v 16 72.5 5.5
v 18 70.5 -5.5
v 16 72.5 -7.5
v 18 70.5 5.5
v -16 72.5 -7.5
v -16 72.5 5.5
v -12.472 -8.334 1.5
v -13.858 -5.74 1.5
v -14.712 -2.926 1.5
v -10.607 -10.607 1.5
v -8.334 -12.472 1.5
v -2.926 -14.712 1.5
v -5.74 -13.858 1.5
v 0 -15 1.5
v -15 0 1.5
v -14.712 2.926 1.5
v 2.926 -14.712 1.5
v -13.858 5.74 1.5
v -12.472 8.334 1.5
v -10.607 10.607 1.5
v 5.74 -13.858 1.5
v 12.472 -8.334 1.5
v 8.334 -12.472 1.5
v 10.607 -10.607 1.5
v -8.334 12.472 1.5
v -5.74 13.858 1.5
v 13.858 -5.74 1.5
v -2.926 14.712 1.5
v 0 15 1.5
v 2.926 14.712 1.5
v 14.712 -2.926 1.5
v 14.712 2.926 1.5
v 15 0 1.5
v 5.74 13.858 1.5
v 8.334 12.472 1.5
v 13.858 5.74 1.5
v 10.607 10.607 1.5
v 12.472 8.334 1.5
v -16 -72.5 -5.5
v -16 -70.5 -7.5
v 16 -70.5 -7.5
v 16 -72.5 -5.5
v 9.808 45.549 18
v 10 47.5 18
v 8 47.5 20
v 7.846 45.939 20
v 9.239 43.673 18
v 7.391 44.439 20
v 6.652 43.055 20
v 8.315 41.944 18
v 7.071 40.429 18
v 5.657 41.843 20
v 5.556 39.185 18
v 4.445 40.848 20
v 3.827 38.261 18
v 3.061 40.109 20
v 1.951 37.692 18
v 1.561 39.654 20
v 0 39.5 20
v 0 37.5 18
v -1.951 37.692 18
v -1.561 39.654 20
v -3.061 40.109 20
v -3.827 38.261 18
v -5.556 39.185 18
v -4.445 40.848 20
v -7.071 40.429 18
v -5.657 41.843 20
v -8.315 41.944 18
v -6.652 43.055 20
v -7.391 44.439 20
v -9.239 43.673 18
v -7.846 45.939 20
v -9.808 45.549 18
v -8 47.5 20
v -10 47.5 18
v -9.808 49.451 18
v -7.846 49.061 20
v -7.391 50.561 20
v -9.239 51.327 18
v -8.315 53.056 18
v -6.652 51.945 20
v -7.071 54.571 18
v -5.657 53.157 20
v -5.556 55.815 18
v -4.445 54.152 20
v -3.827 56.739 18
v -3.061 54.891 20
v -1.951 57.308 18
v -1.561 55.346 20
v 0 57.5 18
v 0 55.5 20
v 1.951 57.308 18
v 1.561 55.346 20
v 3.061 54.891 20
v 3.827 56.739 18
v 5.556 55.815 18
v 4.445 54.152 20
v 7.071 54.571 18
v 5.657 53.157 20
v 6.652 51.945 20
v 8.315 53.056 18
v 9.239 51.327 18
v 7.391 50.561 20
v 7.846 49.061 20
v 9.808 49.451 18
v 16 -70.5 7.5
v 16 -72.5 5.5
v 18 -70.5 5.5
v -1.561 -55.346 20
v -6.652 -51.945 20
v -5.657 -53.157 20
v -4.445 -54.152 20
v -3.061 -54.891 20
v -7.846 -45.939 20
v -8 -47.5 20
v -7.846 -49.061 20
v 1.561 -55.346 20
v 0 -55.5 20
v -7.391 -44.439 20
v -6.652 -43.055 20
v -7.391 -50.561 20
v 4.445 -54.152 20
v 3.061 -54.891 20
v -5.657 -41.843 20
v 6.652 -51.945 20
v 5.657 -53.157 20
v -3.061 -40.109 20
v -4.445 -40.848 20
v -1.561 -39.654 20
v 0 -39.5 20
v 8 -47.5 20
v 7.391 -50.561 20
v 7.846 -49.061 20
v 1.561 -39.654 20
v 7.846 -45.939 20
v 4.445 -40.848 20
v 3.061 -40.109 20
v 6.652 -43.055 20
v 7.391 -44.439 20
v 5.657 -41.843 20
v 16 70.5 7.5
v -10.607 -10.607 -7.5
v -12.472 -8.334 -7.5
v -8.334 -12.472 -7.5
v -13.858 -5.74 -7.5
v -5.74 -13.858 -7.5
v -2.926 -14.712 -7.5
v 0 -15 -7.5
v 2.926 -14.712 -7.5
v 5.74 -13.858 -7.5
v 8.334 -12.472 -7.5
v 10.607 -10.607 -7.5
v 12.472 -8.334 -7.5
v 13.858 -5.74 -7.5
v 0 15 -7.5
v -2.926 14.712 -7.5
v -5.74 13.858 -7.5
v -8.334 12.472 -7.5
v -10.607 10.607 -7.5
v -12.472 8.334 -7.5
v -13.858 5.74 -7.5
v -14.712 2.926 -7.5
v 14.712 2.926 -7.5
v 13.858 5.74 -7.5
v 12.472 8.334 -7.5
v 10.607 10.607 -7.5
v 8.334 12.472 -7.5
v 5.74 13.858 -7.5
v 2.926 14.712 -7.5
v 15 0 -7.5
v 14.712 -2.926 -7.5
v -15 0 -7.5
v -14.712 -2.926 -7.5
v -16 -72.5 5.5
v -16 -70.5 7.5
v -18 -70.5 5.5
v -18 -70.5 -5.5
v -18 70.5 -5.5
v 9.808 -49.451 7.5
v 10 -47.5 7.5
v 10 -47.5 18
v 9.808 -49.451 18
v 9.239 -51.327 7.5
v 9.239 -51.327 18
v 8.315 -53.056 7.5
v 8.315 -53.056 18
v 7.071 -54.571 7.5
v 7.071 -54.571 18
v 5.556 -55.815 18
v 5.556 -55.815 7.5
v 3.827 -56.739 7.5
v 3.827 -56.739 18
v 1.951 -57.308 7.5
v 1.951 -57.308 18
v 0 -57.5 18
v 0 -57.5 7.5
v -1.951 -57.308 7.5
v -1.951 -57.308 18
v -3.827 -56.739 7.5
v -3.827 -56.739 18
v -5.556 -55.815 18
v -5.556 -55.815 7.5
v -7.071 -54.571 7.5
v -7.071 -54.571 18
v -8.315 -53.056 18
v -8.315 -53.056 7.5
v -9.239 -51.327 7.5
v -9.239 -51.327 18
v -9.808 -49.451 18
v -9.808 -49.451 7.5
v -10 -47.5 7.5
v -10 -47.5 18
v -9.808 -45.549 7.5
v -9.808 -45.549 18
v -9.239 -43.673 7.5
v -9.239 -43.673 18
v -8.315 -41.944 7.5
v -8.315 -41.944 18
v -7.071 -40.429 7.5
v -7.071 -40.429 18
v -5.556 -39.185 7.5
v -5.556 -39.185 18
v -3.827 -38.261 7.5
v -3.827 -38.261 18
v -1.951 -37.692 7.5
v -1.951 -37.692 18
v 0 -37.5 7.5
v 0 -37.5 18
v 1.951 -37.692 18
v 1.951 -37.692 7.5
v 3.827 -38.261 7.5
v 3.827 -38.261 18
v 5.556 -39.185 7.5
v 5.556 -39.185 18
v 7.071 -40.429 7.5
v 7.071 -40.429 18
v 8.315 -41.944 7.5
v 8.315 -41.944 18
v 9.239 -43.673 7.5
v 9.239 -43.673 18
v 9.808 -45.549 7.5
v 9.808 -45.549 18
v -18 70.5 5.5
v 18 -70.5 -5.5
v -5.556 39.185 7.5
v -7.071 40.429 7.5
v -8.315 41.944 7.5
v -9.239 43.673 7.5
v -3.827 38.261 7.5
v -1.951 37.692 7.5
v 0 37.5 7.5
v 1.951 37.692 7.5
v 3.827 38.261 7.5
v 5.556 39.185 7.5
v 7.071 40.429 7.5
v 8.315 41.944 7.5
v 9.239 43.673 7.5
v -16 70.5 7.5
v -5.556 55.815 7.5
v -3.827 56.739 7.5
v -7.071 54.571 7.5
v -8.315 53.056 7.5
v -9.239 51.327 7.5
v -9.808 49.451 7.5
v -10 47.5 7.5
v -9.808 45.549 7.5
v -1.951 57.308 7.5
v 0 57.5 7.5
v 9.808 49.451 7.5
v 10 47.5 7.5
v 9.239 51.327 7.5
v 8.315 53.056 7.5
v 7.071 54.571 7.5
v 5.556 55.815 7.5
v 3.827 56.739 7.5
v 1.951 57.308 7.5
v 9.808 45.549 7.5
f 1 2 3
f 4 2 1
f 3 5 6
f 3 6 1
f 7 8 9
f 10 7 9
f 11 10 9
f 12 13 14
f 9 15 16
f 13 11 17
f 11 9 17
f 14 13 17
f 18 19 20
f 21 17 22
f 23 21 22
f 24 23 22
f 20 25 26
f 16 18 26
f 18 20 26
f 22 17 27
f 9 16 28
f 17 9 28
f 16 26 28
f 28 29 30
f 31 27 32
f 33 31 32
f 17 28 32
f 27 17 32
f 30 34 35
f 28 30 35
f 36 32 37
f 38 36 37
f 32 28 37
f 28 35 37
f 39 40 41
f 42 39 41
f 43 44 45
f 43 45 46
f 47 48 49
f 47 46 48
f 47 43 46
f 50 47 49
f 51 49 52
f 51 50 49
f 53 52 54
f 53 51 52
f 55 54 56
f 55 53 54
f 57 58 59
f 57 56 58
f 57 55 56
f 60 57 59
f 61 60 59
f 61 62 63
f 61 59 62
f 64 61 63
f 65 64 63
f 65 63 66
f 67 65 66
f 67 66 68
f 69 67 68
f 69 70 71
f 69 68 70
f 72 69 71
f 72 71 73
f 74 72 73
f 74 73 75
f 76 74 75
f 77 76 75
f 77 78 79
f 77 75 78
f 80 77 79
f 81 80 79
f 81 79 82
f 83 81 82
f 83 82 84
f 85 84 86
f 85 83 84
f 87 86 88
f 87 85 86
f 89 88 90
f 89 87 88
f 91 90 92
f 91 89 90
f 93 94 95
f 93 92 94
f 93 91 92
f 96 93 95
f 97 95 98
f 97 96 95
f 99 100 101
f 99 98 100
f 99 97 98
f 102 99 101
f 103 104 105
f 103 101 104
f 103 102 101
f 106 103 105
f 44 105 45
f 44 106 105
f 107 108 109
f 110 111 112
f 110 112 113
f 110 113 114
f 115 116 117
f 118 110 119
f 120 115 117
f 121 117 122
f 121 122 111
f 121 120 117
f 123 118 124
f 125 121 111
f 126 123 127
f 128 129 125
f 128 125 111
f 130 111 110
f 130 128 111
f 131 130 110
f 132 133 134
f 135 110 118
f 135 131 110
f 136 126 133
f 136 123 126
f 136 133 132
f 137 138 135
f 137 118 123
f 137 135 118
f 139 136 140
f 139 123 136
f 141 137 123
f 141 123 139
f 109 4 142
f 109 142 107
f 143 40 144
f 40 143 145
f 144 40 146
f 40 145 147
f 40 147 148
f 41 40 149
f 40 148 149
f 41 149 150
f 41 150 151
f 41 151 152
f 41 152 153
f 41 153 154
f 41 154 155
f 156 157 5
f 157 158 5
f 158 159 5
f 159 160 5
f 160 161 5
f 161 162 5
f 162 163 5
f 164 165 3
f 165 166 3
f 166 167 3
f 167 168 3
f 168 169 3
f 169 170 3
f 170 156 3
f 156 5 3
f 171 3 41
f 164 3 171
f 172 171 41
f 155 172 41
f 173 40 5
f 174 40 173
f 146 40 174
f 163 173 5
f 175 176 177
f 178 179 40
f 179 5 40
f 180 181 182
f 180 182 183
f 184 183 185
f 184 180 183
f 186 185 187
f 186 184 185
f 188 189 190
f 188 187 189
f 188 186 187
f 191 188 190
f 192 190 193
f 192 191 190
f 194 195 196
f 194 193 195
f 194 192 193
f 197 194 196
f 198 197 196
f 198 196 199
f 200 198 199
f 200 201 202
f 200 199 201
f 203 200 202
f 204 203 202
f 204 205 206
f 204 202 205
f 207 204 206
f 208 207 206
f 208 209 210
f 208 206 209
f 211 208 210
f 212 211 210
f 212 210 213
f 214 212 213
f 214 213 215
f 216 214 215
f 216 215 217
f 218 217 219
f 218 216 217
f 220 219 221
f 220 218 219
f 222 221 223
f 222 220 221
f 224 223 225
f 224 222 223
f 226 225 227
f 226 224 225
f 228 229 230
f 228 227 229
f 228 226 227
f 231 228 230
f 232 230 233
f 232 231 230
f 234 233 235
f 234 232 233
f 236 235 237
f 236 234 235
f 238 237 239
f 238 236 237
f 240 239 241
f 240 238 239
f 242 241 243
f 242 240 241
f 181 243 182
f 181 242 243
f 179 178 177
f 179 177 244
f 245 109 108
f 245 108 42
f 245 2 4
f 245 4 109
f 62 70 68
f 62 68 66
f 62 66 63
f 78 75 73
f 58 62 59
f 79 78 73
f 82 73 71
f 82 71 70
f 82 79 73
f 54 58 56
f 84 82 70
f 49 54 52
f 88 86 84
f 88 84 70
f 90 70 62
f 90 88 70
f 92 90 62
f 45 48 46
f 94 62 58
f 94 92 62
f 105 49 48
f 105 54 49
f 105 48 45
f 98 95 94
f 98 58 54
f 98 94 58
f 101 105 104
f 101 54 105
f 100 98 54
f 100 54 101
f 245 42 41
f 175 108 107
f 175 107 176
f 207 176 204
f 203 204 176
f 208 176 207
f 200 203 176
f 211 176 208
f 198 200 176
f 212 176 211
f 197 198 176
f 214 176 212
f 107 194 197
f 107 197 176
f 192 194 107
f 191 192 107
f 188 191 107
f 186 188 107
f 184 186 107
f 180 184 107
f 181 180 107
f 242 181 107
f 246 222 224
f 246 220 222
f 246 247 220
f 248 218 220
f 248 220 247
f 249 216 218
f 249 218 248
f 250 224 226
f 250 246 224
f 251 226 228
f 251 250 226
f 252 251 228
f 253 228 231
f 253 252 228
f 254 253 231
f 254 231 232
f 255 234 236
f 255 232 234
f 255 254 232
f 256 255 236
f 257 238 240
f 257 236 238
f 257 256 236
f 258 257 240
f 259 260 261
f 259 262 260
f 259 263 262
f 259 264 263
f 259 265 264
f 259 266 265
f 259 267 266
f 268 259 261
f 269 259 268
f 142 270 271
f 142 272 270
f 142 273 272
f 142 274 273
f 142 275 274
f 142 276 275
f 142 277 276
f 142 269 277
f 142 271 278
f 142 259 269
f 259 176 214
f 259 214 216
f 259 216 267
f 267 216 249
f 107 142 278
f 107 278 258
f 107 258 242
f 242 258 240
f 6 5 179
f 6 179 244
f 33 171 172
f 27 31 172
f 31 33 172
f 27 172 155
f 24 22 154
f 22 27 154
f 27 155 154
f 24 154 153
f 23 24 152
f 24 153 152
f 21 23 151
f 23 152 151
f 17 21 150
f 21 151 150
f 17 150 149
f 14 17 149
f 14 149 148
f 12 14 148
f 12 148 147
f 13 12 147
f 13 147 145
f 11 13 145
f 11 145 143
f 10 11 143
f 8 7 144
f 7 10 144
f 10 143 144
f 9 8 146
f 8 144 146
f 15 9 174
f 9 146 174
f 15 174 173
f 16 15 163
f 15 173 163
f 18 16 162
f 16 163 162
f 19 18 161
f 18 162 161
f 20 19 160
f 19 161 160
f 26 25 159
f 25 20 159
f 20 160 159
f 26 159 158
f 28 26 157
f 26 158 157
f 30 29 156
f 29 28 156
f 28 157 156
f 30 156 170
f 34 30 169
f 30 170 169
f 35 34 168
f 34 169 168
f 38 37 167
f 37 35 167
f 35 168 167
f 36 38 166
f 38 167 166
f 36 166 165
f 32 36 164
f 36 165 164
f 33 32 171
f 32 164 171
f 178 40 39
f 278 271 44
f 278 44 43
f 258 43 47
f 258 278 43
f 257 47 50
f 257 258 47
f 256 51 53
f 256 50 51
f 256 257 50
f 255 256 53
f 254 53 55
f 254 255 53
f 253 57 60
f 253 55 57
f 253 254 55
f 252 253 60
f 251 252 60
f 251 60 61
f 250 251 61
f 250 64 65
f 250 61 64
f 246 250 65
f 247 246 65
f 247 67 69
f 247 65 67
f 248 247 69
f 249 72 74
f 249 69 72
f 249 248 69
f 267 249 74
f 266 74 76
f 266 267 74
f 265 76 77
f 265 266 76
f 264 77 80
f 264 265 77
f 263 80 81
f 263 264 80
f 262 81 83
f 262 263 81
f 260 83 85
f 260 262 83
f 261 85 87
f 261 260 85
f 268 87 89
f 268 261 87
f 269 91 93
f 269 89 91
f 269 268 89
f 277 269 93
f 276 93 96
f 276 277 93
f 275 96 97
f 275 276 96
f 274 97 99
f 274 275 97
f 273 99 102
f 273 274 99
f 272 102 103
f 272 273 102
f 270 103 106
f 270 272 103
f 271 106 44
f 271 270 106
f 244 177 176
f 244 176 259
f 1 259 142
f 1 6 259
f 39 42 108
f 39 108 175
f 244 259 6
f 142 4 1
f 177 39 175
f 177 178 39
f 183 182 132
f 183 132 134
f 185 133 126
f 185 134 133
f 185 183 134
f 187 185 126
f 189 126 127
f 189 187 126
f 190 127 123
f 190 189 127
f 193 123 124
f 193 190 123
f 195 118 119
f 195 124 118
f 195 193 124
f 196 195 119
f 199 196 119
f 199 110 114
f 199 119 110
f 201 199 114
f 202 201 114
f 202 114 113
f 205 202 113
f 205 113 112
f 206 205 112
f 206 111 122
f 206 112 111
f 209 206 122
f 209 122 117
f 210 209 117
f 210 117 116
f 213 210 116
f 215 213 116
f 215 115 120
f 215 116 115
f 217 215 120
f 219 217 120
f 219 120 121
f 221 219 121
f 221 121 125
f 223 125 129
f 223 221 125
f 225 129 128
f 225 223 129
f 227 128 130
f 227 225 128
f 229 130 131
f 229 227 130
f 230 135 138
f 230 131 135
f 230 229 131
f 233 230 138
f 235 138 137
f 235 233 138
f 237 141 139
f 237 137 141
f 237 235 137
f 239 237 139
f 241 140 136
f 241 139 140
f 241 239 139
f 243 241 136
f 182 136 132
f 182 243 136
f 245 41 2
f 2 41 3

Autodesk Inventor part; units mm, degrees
ref_plane "YZ Plane" through (0, 0, 0) normal (1, 0, 0) x (0, 1, 0)
ref_plane "XZ Plane" through (0, 0, 0) normal (0, 1, 0) x (-1, 0, 0)
ref_plane "XY Plane" through (0, 0, 0) normal (0, 0, 1) x (1, 0, 0)
sketch "Sketch1" plane through (0, 0, 0) normal (0, 0, 1) x (1, 0, 0)
  line L0 (223.4483, -72.5) -> (-46.5517, -72.5)
  line L1 (-46.5517, -72.5) -> (-46.5517, 72.5)
  line L2 (-46.5517, 72.5) -> (223.4483, 72.5)
  line L3 (223.4483, 72.5) -> (223.4483, -72.5)
  line L4 (223.4483, -72.5) -> (-46.5517, 72.5) construction
  line L5 (-46.5517, -72.5) -> (223.4483, 72.5) construction
  circle A0 centre (0, 47.5) radius 10
  line L6 (18, -72.5) -> (-18, -72.5)
  line L7 (-18, -72.5) -> (-18, 72.5)
  line L8 (-18, 72.5) -> (18, 72.5)
  line L9 (18, 72.5) -> (18, -72.5)
  line L10 (18, -72.5) -> (-18, 72.5) construction
  line L11 (-18, -72.5) -> (18, 72.5) construction
  line L12 (-100.5517, 0) -> (277.4483, 0) construction
  line L13 (0, 101.5) -> (0, -101.5) construction
  circle A1 centre (0, -47.5) radius 10
  line L14 (0, -101.5) -> (0, 101.5) construction
  circle A2 centre (0, 0) radius 15
  point P0 (88.4483, 0)
  dimension "d0" = 145
  dimension "d1" = 270
  dimension "d2" = 20
  dimension "d3" = 25
  dimension "d4" = 36
  dimension "d5" = 30
extrude "Extrusion1" add sketch "Sketch1" along normal mid plane 15 contours L0 L7 L2 L9
extrude "Extrusion2" add sketch "Sketch1" against normal blind 7.5 contours A0 | A1
extrude "Extrusion3" add sketch "Sketch1" along normal blind 20 contours A0 | A1
sketch "Sketch2" plane through (0, 0, 7.5) normal (0, 0, 1) x (1, 0, 0)
  line L0 (18, 72.5) -> (-18, 72.5) projected
  line L1 (-18, 72.5) -> (-18, -72.5) projected
  line L2 (-18, -72.5) -> (18, -72.5) projected
  line L3 (18, -72.5) -> (18, 72.5) projected
  circle A0 centre (0, 0) radius 15 projected
  circle A1 centre (0, -47.5) radius 10 projected
  circle A2 centre (0, 47.5) radius 10 projected
extrude "Extrusion4" add sketch "Sketch2" against normal blind 6 contours A0
chamfer "Chamfer1" distance 2 angle 45 13 edges at (0, -72.5, 7.5) (18, -72.5, 0) (0, -72.5, -7.5) (18, 0, -7.5) (18, 0, 7.5) (18, 72.5, 0) (0, 72.5, 7.5) (-18, 0, 7.5) (-10, 47.5, 20) (-10, -47.5, 20) (-18, 0, -7.5) (-18, -72.5, 0) (-18, 72.5, 0)
properties part number "hydraulic_mech" material "Steel, Mild"
